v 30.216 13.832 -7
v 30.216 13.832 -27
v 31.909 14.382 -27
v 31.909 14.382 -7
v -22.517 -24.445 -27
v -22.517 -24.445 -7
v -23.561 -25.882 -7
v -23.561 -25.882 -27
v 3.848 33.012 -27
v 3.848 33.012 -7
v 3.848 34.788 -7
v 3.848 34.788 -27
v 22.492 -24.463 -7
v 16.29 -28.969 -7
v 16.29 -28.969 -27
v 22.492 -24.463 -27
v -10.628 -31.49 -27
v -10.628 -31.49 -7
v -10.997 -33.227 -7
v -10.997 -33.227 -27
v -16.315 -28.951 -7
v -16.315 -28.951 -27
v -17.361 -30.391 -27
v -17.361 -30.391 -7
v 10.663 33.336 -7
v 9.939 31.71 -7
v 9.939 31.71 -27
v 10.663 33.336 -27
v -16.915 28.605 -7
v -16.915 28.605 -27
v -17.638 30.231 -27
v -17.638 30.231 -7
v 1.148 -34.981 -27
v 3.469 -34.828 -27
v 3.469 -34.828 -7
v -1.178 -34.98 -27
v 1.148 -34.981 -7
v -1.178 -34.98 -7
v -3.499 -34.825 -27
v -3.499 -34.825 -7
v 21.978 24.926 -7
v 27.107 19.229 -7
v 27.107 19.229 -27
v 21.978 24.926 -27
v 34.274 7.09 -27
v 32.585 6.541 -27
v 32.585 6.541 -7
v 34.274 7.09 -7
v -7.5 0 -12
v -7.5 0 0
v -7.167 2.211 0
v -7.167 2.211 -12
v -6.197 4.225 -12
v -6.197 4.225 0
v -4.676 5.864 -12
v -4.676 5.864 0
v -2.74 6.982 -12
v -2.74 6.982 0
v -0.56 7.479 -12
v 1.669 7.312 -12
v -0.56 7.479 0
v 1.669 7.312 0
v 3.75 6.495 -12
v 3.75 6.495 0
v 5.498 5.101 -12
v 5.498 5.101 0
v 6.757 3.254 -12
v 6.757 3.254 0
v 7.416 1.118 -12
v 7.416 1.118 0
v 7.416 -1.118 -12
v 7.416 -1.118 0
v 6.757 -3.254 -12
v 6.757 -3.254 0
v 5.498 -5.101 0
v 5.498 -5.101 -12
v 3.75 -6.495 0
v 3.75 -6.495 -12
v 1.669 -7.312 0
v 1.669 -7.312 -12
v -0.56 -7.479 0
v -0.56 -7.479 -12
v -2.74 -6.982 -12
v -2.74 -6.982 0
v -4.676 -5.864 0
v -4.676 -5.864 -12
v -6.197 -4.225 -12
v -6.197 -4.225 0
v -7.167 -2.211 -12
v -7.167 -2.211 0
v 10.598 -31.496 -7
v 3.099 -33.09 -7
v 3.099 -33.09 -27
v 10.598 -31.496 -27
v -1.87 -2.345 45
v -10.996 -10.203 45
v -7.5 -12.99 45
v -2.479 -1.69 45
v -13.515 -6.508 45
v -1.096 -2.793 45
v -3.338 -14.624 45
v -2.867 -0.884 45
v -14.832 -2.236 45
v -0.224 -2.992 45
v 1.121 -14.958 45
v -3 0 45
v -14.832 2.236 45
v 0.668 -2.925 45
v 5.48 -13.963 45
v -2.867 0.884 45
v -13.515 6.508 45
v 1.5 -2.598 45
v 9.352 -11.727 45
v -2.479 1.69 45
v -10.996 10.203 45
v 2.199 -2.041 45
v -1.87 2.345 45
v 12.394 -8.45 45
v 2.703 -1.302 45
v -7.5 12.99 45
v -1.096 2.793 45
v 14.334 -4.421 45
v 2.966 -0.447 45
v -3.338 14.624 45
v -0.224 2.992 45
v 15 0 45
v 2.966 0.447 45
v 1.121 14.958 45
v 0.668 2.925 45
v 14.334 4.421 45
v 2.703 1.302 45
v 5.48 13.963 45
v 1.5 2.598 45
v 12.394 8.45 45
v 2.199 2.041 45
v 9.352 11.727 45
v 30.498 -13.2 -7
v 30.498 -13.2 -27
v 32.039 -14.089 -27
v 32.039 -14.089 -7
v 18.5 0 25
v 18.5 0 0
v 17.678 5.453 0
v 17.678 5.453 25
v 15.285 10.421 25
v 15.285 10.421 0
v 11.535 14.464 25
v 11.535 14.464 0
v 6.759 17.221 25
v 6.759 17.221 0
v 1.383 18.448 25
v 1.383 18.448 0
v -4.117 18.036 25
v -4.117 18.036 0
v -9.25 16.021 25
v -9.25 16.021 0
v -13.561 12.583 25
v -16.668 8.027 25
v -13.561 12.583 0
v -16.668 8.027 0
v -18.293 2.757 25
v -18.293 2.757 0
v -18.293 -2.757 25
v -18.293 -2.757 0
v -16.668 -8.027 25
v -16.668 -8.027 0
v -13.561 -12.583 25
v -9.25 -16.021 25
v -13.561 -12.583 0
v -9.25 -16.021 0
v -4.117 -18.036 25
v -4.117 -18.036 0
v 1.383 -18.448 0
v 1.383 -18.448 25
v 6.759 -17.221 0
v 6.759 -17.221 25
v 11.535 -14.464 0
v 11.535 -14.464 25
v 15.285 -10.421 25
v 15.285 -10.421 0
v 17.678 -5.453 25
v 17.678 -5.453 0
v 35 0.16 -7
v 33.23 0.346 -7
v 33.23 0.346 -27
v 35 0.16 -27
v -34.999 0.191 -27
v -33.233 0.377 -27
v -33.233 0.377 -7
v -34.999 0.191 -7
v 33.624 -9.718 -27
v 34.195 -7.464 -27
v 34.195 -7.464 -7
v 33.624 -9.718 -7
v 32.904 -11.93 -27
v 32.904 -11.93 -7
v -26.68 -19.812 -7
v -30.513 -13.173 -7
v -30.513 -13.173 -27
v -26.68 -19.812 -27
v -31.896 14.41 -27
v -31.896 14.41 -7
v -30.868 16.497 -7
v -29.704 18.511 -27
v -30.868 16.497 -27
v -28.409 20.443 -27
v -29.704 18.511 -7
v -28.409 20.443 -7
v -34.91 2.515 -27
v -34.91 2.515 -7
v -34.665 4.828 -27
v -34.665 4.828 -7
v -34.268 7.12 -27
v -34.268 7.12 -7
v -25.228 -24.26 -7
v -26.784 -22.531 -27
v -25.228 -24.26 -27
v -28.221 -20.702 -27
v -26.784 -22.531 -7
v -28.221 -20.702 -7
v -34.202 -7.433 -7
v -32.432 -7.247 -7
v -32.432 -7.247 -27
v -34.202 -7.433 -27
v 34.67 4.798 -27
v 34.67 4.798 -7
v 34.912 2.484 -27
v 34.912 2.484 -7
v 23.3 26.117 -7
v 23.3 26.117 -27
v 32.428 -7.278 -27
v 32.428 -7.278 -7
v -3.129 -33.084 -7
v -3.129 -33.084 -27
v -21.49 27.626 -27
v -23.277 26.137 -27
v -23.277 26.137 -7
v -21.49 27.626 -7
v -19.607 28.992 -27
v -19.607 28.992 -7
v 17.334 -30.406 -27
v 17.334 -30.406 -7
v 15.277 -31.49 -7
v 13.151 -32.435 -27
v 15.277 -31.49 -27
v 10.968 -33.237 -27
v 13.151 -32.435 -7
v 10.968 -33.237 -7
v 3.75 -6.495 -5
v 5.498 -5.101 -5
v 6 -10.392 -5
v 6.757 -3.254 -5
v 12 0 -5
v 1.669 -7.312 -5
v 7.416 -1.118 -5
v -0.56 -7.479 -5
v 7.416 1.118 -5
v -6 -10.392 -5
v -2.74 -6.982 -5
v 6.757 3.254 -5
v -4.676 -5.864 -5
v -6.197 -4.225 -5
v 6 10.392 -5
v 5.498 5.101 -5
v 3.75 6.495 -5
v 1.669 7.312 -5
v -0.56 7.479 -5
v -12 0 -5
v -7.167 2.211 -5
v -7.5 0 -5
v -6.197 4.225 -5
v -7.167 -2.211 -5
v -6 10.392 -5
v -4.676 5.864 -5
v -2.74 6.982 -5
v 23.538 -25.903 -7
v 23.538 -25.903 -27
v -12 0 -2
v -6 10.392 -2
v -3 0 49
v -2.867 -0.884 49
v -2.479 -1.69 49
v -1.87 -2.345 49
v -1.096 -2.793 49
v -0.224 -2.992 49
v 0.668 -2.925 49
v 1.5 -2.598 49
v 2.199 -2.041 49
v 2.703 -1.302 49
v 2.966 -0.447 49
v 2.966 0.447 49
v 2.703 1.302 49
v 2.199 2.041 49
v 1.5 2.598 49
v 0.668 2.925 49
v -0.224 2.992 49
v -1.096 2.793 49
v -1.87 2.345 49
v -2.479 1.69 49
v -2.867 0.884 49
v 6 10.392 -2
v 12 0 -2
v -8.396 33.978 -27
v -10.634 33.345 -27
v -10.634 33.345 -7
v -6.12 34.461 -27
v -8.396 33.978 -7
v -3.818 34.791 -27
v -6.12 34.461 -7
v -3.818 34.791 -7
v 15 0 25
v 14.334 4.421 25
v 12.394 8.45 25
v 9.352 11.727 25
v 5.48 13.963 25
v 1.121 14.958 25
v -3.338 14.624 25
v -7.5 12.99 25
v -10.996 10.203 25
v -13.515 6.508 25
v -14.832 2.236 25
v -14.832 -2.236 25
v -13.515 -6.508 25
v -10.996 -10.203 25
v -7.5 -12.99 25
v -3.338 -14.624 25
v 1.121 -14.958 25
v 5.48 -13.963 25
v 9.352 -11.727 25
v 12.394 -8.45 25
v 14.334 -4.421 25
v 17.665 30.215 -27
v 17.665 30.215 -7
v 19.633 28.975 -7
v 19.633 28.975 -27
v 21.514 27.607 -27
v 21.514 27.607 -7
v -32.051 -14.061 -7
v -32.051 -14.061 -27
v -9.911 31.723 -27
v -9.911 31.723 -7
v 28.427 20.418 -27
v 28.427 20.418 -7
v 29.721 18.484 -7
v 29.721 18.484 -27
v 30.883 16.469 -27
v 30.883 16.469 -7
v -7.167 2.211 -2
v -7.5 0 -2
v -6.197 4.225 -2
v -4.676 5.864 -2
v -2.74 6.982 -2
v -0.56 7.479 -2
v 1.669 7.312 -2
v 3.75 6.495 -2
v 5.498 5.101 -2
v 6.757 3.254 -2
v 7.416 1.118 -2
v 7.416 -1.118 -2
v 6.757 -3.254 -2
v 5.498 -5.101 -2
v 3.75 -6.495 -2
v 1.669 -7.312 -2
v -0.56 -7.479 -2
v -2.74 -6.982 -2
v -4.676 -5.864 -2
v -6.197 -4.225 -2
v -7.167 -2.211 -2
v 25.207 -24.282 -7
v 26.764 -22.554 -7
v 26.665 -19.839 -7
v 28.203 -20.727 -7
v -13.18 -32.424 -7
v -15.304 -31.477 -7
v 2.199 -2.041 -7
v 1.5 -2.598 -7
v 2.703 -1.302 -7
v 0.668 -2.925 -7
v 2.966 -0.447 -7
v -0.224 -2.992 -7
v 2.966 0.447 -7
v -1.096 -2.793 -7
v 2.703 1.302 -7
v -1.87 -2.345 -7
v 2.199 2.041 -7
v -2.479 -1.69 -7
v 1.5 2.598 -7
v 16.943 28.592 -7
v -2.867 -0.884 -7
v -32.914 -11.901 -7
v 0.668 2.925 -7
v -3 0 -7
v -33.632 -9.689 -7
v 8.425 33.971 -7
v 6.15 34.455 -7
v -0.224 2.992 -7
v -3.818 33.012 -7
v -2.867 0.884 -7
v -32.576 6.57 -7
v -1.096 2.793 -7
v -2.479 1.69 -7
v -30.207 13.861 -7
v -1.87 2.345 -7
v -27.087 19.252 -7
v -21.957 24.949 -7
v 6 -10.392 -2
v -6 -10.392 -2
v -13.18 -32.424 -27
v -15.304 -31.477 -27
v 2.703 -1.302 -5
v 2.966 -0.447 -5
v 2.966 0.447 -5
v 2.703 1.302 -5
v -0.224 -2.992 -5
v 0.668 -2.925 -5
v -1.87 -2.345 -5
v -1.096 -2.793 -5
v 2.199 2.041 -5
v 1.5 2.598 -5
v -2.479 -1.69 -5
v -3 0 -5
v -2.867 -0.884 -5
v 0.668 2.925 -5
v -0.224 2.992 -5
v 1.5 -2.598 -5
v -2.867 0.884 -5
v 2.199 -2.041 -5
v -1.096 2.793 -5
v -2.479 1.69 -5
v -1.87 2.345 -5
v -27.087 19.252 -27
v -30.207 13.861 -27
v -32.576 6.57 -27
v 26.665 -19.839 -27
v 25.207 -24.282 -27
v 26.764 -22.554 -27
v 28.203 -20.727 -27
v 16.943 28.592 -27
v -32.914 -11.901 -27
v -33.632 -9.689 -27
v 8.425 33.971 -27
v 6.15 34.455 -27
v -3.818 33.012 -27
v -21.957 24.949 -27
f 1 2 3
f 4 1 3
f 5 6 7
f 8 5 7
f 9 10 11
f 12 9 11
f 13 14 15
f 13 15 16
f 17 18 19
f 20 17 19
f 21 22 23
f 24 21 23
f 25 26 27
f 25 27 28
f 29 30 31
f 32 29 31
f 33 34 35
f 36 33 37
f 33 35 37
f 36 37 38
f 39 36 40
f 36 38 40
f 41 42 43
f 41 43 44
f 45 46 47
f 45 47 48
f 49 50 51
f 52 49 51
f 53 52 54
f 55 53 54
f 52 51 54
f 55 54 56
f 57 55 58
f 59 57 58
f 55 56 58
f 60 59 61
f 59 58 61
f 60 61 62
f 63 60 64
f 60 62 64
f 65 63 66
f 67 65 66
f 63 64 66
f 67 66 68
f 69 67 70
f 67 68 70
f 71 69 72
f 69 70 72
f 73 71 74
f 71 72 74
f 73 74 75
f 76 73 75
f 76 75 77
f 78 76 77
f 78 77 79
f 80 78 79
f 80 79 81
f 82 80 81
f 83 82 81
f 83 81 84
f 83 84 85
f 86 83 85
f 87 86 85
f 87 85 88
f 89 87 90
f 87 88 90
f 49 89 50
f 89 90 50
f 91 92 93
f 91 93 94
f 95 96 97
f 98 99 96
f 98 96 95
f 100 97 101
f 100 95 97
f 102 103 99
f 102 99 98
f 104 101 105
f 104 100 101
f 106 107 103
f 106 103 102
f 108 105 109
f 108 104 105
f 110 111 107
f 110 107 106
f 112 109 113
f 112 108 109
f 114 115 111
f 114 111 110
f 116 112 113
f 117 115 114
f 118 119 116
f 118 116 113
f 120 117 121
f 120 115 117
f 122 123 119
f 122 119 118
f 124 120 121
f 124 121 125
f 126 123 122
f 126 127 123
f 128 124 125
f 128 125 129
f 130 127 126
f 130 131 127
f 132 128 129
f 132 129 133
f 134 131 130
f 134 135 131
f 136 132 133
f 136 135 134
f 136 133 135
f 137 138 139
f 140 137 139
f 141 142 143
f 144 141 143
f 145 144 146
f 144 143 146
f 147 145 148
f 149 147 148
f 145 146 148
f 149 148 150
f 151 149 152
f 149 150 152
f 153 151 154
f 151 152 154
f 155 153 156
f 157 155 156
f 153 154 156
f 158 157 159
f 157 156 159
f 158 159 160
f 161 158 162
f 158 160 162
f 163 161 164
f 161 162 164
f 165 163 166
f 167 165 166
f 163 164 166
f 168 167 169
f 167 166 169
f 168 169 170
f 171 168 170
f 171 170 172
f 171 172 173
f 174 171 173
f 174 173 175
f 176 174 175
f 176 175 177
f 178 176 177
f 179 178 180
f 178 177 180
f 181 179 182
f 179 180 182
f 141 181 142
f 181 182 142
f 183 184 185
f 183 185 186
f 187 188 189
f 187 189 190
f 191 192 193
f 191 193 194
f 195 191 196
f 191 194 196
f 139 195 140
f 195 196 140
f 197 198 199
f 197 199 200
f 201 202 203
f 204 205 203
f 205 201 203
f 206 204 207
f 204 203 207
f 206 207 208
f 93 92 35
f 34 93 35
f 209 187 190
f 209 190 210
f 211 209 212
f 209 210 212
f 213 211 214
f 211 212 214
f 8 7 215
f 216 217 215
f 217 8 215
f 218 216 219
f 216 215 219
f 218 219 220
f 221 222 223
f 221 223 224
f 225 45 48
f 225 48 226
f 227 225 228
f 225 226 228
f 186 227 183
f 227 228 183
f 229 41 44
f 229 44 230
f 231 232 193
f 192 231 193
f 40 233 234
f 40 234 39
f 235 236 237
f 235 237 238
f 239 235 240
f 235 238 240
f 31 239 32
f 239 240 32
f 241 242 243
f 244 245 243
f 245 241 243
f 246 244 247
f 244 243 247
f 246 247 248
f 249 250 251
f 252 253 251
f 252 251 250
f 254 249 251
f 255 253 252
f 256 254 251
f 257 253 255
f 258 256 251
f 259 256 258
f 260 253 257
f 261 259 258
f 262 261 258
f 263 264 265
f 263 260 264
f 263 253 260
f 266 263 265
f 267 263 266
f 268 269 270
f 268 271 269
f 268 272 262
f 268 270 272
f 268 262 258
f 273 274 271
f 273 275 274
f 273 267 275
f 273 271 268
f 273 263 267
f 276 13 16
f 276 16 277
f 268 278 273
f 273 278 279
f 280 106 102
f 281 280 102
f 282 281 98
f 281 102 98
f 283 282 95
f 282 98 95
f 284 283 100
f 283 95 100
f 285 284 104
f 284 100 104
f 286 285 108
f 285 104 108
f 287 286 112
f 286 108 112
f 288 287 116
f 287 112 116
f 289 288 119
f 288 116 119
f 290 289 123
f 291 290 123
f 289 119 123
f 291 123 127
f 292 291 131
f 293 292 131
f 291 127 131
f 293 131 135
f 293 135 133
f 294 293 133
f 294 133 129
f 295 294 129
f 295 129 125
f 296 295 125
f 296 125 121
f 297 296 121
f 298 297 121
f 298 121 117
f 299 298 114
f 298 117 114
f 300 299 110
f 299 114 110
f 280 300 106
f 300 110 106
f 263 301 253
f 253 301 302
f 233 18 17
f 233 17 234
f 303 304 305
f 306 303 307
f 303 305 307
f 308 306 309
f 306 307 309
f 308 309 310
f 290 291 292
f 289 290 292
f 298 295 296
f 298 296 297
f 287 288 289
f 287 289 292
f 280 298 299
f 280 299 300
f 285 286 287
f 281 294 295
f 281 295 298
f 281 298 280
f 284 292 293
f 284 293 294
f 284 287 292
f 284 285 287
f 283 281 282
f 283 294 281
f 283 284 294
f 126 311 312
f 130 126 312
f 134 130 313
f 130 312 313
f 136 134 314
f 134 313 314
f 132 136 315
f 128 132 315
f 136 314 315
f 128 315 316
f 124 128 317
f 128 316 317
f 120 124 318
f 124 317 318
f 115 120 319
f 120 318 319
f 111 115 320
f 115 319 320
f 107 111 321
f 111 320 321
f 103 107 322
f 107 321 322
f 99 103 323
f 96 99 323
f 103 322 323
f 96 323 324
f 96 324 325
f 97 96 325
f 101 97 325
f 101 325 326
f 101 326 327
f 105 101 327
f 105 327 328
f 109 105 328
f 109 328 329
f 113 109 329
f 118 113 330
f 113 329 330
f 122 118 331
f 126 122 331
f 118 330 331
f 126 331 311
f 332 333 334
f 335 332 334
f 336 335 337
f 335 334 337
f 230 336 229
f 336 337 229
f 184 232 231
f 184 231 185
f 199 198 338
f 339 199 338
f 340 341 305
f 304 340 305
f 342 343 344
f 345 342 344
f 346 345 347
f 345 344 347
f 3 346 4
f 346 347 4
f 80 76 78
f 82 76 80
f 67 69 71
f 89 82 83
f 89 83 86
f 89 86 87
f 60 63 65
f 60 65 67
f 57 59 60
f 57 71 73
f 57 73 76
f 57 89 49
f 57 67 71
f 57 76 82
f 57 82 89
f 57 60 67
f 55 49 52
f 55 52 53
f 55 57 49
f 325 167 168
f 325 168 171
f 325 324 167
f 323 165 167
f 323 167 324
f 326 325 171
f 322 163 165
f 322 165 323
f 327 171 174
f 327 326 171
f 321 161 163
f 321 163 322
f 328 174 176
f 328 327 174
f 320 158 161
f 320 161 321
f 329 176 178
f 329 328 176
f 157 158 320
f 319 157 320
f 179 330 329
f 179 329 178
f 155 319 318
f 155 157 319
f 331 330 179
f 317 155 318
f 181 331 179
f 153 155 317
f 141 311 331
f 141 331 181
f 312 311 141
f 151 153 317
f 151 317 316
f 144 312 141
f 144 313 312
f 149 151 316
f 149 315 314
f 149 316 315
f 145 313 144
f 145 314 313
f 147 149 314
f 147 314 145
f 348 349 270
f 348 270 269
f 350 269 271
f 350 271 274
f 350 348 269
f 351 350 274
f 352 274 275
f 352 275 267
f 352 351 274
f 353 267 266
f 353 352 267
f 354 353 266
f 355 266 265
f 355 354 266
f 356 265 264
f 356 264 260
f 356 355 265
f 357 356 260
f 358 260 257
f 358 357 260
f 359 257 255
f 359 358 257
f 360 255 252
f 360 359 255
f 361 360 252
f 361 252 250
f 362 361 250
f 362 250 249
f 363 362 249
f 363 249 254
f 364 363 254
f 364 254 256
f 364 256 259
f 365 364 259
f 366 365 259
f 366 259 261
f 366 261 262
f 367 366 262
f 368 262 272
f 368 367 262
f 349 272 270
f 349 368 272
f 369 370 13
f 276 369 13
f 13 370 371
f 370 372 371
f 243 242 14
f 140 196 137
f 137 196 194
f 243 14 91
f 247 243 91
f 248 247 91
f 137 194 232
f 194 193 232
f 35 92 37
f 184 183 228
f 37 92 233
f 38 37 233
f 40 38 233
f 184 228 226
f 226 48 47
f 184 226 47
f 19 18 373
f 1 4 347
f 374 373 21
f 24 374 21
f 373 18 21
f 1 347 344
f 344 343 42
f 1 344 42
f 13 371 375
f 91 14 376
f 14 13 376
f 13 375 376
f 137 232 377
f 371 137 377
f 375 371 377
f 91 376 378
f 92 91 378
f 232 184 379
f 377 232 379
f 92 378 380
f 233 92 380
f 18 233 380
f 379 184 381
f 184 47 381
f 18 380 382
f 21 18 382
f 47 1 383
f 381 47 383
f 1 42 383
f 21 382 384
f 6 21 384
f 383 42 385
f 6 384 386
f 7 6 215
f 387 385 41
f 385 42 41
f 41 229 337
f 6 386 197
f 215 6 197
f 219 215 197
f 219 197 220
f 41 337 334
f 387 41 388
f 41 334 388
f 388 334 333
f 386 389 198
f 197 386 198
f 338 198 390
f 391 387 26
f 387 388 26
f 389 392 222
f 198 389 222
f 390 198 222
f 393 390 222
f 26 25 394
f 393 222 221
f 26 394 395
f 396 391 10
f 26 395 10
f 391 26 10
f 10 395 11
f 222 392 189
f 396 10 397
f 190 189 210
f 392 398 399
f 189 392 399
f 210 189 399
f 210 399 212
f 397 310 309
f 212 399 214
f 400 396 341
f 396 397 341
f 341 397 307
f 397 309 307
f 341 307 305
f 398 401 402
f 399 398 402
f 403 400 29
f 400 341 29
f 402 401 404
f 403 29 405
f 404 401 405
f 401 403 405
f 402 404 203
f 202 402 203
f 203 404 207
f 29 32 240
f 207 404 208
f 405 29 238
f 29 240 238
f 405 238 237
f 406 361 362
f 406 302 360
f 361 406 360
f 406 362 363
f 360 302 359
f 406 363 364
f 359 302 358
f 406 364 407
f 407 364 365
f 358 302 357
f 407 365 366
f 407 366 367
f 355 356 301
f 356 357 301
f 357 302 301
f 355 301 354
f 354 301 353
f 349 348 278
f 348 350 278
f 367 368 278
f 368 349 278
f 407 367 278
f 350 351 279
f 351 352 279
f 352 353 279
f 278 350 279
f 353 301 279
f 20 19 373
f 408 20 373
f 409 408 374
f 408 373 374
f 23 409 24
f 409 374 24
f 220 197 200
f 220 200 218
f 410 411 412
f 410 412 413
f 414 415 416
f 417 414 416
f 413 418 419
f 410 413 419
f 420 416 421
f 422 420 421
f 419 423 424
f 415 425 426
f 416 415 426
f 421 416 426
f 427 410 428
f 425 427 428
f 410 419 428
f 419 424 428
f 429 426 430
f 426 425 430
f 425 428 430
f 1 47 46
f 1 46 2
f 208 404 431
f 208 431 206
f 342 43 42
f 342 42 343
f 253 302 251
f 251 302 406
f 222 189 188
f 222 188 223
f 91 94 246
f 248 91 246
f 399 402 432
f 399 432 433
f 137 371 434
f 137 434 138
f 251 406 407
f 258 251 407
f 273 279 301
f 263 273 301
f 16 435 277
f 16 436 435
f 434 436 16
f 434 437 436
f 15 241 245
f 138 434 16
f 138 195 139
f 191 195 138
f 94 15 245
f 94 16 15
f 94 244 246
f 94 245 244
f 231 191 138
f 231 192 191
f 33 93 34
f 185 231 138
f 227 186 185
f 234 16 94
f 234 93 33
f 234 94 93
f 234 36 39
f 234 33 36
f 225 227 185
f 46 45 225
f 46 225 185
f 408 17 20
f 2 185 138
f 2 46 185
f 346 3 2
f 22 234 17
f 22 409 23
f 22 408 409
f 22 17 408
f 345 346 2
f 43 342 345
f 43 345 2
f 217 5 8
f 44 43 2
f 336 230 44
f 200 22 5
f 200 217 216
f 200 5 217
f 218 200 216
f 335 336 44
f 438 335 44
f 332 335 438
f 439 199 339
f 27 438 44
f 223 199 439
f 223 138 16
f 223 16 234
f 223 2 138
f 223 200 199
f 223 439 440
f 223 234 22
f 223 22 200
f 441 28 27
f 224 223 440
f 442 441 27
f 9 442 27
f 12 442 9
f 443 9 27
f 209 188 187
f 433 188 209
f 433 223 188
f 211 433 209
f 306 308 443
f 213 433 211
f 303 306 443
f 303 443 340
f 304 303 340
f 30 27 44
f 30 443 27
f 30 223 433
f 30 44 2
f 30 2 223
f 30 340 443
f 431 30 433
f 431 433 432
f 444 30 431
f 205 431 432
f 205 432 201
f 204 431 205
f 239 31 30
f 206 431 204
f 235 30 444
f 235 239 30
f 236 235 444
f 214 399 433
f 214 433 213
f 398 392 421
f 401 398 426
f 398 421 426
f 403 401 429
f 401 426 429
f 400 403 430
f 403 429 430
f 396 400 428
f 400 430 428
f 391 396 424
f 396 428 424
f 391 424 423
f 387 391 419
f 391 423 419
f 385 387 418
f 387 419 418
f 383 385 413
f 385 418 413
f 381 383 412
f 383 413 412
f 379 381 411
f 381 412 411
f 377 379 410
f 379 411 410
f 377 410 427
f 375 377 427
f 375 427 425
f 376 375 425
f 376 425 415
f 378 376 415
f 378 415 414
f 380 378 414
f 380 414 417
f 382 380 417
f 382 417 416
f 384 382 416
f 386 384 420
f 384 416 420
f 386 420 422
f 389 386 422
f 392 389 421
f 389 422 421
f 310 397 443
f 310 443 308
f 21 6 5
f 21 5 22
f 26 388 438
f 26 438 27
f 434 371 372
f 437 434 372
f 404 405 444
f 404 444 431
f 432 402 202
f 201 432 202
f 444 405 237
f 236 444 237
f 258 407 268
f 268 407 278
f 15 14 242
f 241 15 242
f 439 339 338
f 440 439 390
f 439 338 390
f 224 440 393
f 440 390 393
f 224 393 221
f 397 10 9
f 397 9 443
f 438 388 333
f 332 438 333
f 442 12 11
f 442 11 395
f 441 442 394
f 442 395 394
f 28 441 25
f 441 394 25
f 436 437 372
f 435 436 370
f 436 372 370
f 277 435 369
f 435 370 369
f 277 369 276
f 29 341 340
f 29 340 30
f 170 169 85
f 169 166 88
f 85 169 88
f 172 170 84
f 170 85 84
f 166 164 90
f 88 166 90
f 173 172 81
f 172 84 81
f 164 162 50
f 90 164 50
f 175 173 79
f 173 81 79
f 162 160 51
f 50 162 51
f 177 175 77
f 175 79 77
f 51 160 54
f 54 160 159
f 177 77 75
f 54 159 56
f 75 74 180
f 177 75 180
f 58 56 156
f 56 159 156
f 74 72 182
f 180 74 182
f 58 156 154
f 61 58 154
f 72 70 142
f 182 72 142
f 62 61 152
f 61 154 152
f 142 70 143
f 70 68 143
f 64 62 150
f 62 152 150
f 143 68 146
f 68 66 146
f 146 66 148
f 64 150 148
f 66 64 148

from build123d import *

# Parameters (mm, degrees)
SKETCH1_R           = 18.5
BOSS_EXTRUDE1_DEPTH = 25
SKETCH2_R           = 15
BOSS_EXTRUDE2_DEPTH = 20
SKETCH10_R          = 7.5
BOSS_EXTRUDE8_DEPTH = 12
SKETCH7_R           = 7.5
BOSS_EXTRUDE6_DEPTH = 3
SKETCH4_R           = 3
BOSS_EXTRUDE4_DEPTH = 22
SKETCH5_R           = 1.90826202
CUT_EXTRUDE1_DEPTH  = 22
SKETCH6_R           = 3
BOSS_EXTRUDE5_DEPTH = 4
SKETCH8_R           = 35
BOSS_EXTRUDE7_DEPTH = 20
SKETCH9_W           = 7.665881166
SKETCH9_H           = 2.190251761
CUT_EXTRUDE2_DEPTH  = 20
CIRPATTERN1_COUNT   = 15


with BuildPart() as part:
    # Sketch1 → Boss-Extrude1 (new body)
    with BuildSketch(Plane.XY):
        Circle(SKETCH1_R)
    extrude(amount=BOSS_EXTRUDE1_DEPTH)

    # Sketch2 → Boss-Extrude2 (add)
    with BuildSketch(Plane.XY.offset(25)):
        Circle(SKETCH2_R)
    extrude(amount=BOSS_EXTRUDE2_DEPTH)

    # Sketch10 → Boss-Extrude8 (add)
    with BuildSketch(Plane(origin=(0, 0, 0), x_dir=(-1, 0, 0), z_dir=(0, 0, -1))):
        Circle(SKETCH10_R)
    extrude(amount=BOSS_EXTRUDE8_DEPTH)

    # Sketch6 → Boss-Extrude5 (add)
    with BuildSketch(Plane.XY.offset(45)):
        with Locations(Location((0, 0, 0), (0, 0, 180))):
            Circle(SKETCH6_R)
    extrude(amount=BOSS_EXTRUDE5_DEPTH)


with BuildPart() as body_2:
    # Sketch7 → Boss-Extrude6 (new body)
    with BuildSketch(Plane(origin=(0, 0, -2), x_dir=(-1, 0, 0), z_dir=(0, 0, -1))):
        Polygon((12, 0), (6, 10.392304845), (-6, 10.392304845), (-12, 0), (-6, -10.392304845), (6, -10.392304845), align=None)
        Circle(SKETCH7_R, mode=Mode.SUBTRACT)
    extrude(amount=BOSS_EXTRUDE6_DEPTH)


with BuildPart() as body_3:
    # Sketch4 → Boss-Extrude4 (new body)
    with BuildSketch(Plane(origin=(0, 0, -5), x_dir=(-1, 0, 0), z_dir=(0, 0, -1))):
        Circle(SKETCH4_R)
    extrude(amount=BOSS_EXTRUDE4_DEPTH)

    # Sketch5 → Cut-Extrude1 (cut)
    with BuildSketch(Plane(origin=(-0.01048154, 7.617602547, 0), x_dir=(0.9999990533641856, 0.0013759617482230274, 0), z_dir=(-0.0013759617482230274, 0.9999990533641857, 0))):
        with Locations(Location((-0.062479022, 19, 0), (0, 0, 180))):
            Circle(SKETCH5_R)
    extrude(amount=-CUT_EXTRUDE1_DEPTH, mode=Mode.SUBTRACT)

    # Sketch8 → Boss-Extrude7 (add)
    with BuildSketch(Plane(origin=(0, 0, -7), x_dir=(-1, 0, 0), z_dir=(0, 0, -1))):
        Circle(SKETCH8_R)
    extrude(amount=BOSS_EXTRUDE7_DEPTH)

    # Sketch9 → Cut-Extrude2 (cut)
    with BuildSketch(Plane(origin=(0, 0, -27), x_dir=(-1, 0, 0), z_dir=(0, 0, -1))):
        with Locations((-0.015351428, 34.106719759)):
            Rectangle(SKETCH9_W, SKETCH9_H)
    cut_extrude2 = extrude(amount=-CUT_EXTRUDE2_DEPTH, mode=Mode.SUBTRACT)

    # CirPattern1: Cut-Extrude2 ×15 about axis
    cirpattern1_axis = Axis((0, 0, 0), (0, 0, 1))
    for i in range(1, CIRPATTERN1_COUNT):
        add(cut_extrude2.rotate(cirpattern1_axis, i * 360 / CIRPATTERN1_COUNT), mode=Mode.SUBTRACT)


solid = Compound([part.part, body_2.part, body_3.part])
